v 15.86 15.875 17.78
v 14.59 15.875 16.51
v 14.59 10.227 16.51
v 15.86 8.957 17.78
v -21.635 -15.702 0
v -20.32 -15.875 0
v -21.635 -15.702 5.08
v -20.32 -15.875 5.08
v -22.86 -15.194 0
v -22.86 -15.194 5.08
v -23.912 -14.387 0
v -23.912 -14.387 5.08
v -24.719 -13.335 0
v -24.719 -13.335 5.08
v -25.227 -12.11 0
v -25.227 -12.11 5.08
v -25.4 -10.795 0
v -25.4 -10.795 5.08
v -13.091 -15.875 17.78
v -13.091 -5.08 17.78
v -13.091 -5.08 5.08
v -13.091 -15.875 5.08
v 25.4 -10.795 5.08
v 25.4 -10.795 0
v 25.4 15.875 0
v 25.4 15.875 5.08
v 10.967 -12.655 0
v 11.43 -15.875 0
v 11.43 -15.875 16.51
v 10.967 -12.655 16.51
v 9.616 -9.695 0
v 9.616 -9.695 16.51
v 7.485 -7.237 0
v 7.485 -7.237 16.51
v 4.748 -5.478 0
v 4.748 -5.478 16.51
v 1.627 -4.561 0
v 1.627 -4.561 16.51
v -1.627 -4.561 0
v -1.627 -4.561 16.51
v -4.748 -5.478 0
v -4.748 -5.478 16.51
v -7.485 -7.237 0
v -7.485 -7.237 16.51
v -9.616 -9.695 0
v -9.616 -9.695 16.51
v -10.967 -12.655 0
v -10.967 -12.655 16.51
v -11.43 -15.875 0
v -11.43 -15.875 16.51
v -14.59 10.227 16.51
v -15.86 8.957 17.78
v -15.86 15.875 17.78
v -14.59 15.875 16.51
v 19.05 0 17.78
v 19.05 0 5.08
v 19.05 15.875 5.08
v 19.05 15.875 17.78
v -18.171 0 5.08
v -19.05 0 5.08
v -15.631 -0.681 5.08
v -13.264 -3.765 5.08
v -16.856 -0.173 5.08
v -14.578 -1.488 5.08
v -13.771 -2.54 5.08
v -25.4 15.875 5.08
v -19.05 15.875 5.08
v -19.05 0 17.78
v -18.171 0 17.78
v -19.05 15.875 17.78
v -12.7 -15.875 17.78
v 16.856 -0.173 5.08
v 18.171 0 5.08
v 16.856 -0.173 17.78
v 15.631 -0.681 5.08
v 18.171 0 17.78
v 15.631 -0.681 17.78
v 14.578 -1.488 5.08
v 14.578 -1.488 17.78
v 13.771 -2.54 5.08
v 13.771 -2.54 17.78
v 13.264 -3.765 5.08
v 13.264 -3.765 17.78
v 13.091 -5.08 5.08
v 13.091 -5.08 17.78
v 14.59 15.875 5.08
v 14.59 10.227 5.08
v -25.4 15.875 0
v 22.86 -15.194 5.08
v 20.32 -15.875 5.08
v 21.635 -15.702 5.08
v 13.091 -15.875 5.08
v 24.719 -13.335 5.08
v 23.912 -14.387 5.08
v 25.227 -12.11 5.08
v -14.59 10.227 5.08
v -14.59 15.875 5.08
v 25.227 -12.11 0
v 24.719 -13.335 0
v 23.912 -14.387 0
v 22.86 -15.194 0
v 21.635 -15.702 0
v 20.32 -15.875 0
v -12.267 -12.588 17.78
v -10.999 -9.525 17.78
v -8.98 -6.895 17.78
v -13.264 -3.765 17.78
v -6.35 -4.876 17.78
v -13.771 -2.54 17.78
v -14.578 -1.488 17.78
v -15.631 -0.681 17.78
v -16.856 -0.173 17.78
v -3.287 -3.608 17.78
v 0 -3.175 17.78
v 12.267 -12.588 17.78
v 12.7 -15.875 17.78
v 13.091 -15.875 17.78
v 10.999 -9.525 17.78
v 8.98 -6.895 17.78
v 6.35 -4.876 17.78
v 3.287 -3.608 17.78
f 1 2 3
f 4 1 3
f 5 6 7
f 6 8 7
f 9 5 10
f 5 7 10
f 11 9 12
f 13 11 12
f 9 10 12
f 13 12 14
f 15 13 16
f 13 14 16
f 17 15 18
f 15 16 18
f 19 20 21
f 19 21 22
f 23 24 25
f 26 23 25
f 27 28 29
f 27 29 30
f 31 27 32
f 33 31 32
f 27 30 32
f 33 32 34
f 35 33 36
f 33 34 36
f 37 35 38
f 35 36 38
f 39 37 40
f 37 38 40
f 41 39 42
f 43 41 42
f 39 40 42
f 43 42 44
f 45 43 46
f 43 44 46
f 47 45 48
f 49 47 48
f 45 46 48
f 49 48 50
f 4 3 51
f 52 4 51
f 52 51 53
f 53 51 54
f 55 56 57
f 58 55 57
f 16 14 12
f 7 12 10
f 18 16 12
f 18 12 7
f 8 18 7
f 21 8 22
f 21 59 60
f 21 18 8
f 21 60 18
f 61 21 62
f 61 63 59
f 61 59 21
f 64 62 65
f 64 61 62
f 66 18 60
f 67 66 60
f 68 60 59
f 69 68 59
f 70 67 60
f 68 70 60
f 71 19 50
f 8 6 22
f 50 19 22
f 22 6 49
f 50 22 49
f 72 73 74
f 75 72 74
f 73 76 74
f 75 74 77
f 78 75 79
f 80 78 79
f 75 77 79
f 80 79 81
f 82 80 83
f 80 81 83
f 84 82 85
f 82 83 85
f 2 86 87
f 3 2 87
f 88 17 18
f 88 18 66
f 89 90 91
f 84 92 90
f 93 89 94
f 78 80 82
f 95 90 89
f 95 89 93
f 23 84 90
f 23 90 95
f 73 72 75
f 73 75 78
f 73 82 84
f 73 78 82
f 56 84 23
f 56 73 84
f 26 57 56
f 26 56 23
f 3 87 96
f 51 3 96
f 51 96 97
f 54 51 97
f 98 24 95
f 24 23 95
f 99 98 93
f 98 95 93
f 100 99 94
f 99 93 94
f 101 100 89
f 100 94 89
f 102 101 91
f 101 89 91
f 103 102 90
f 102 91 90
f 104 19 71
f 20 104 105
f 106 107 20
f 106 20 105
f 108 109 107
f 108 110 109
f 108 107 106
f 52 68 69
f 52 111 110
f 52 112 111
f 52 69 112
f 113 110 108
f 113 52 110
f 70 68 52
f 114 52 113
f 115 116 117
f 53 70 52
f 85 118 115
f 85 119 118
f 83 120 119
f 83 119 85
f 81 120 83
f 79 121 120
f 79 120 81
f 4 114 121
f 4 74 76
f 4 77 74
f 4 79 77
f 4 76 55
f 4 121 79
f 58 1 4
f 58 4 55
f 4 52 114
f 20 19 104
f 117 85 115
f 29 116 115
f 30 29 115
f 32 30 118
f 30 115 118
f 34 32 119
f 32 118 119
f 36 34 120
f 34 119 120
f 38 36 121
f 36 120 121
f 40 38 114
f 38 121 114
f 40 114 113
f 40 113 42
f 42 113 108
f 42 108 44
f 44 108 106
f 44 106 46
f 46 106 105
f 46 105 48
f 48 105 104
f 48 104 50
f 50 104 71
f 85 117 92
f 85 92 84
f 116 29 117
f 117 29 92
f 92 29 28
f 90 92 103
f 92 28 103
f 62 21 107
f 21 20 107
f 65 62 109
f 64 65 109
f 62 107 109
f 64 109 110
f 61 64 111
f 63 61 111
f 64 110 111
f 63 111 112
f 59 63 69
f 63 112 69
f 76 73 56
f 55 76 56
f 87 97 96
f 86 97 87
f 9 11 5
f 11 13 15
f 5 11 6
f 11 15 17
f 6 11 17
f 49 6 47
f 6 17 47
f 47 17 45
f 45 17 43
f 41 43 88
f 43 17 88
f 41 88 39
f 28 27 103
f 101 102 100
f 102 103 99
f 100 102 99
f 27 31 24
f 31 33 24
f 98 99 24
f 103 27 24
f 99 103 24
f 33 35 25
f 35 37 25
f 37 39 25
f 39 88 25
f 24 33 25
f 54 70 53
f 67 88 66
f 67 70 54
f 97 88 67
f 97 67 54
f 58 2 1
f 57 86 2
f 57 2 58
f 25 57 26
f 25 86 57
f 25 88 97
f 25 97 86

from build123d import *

# Parameters (mm, degrees)
F0_W     = 50.8
F0_H     = 31.75
F1_DEPTH = 5.08
F3_DEPTH = 12.7
F5_DEPTH = 17.78
F6_R     = 5.08
F7_R     = 5.08
F8_SIZE  = 1.27


with BuildPart() as f1:
    # F0 (on Top) → F1 (new body)
    with BuildSketch(Plane.XY):
        Rectangle(F0_W, F0_H)
    extrude(amount=F1_DEPTH)

    # F2 (on face) → F3 (join)
    with BuildSketch(Plane.XY.offset(5.08)):
        Polygon((-14.5904901437, 15.875), (-19.05, 15.875), (-19.05, 0), (-13.0905322731, 0), (-13.0905322731, -15.875), (13.0905322731, -15.875), (13.0905322731, 0), (19.05, 0), (19.05, 15.875), (14.5904901437, 15.875), (14.5904901437, 10.2269826457), (-14.5904901437, 10.2269826457), align=None)
    extrude(amount=F3_DEPTH)

    # F4 (on face) → F5 (cut, through all)
    with BuildSketch(Plane.XY.offset(17.78)):
        with BuildLine():
            Line((-11.43, -15.875), (11.43, -15.875))
            ThreePointArc((11.43, -15.875), (0, -4.445), (-11.43, -15.875))
        make_face()
    extrude(amount=-F5_DEPTH, mode=Mode.SUBTRACT)

    # F6
    f6_edges = [f1.edges().sort_by_distance(p)[0] for p in [
        (-13.090532, 0, 11.43),
        (13.090532, 0, 11.43),
    ]]
    fillet(f6_edges, radius=F6_R)

    # F7
    f7_edges = [f1.edges().sort_by_distance(p)[0] for p in [
        (25.4, -15.875, 2.54),
        (-25.4, -15.875, 2.54),
    ]]
    fillet(f7_edges, radius=F7_R)

    # F8
    f8_edges = [f1.edges().sort_by_distance(p)[0] for p in [
        (0, -4.445, 17.78),
        (0, 10.226983, 17.78),
        (-14.59049, 13.050991, 17.78),
        (14.59049, 13.050991, 17.78),
    ]]
    chamfer(f8_edges, length=F8_SIZE)


solid = f1.part
